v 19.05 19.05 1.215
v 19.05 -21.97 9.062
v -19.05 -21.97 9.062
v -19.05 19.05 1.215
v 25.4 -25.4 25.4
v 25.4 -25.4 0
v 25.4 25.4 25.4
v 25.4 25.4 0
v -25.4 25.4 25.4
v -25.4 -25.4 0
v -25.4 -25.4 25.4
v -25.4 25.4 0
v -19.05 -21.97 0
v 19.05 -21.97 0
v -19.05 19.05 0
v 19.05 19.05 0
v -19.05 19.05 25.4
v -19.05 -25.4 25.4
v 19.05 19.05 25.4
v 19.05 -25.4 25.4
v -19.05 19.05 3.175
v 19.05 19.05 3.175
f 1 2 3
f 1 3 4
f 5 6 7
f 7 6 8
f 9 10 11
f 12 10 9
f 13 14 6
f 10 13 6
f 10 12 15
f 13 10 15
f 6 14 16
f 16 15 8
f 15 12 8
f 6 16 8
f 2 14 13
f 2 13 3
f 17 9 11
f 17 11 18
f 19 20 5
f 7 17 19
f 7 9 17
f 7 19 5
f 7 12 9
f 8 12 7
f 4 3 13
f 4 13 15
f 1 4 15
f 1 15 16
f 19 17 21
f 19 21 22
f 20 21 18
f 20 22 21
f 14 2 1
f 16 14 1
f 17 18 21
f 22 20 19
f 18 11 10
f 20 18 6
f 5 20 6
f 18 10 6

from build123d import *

# Parameters (mm, degrees)
F0_W     = 50.8
F0_H     = 50.8
F1_DEPTH = 25.4
F2_W     = 38.1
F2_H     = 44.45
F3_DEPTH = 25.4
F5_DEPTH = 47.752


with BuildPart() as f1:
    # F0 (on Top) → F1 (new body)
    with BuildSketch(Plane.XY):
        Rectangle(F0_W, F0_H)
    extrude(amount=F1_DEPTH)

    # F2 (on face) → F3 (cut)
    with BuildSketch(Plane.XY.offset(25.4)):
        with Locations((0, -3.175)):
            Rectangle(F2_W, F2_H)
    extrude(amount=-F3_DEPTH, mode=Mode.SUBTRACT)

    # F4 (on face) → F5 (join)
    with BuildSketch(Plane.YZ.offset(25.4)):
        Polygon((25.4, 0), (-25.4, 25.4), (-25.4, 0), (-21.969959, 0), (-21.969959, 9.062302), align=None)
    extrude(amount=-F5_DEPTH)


solid = f1.part
